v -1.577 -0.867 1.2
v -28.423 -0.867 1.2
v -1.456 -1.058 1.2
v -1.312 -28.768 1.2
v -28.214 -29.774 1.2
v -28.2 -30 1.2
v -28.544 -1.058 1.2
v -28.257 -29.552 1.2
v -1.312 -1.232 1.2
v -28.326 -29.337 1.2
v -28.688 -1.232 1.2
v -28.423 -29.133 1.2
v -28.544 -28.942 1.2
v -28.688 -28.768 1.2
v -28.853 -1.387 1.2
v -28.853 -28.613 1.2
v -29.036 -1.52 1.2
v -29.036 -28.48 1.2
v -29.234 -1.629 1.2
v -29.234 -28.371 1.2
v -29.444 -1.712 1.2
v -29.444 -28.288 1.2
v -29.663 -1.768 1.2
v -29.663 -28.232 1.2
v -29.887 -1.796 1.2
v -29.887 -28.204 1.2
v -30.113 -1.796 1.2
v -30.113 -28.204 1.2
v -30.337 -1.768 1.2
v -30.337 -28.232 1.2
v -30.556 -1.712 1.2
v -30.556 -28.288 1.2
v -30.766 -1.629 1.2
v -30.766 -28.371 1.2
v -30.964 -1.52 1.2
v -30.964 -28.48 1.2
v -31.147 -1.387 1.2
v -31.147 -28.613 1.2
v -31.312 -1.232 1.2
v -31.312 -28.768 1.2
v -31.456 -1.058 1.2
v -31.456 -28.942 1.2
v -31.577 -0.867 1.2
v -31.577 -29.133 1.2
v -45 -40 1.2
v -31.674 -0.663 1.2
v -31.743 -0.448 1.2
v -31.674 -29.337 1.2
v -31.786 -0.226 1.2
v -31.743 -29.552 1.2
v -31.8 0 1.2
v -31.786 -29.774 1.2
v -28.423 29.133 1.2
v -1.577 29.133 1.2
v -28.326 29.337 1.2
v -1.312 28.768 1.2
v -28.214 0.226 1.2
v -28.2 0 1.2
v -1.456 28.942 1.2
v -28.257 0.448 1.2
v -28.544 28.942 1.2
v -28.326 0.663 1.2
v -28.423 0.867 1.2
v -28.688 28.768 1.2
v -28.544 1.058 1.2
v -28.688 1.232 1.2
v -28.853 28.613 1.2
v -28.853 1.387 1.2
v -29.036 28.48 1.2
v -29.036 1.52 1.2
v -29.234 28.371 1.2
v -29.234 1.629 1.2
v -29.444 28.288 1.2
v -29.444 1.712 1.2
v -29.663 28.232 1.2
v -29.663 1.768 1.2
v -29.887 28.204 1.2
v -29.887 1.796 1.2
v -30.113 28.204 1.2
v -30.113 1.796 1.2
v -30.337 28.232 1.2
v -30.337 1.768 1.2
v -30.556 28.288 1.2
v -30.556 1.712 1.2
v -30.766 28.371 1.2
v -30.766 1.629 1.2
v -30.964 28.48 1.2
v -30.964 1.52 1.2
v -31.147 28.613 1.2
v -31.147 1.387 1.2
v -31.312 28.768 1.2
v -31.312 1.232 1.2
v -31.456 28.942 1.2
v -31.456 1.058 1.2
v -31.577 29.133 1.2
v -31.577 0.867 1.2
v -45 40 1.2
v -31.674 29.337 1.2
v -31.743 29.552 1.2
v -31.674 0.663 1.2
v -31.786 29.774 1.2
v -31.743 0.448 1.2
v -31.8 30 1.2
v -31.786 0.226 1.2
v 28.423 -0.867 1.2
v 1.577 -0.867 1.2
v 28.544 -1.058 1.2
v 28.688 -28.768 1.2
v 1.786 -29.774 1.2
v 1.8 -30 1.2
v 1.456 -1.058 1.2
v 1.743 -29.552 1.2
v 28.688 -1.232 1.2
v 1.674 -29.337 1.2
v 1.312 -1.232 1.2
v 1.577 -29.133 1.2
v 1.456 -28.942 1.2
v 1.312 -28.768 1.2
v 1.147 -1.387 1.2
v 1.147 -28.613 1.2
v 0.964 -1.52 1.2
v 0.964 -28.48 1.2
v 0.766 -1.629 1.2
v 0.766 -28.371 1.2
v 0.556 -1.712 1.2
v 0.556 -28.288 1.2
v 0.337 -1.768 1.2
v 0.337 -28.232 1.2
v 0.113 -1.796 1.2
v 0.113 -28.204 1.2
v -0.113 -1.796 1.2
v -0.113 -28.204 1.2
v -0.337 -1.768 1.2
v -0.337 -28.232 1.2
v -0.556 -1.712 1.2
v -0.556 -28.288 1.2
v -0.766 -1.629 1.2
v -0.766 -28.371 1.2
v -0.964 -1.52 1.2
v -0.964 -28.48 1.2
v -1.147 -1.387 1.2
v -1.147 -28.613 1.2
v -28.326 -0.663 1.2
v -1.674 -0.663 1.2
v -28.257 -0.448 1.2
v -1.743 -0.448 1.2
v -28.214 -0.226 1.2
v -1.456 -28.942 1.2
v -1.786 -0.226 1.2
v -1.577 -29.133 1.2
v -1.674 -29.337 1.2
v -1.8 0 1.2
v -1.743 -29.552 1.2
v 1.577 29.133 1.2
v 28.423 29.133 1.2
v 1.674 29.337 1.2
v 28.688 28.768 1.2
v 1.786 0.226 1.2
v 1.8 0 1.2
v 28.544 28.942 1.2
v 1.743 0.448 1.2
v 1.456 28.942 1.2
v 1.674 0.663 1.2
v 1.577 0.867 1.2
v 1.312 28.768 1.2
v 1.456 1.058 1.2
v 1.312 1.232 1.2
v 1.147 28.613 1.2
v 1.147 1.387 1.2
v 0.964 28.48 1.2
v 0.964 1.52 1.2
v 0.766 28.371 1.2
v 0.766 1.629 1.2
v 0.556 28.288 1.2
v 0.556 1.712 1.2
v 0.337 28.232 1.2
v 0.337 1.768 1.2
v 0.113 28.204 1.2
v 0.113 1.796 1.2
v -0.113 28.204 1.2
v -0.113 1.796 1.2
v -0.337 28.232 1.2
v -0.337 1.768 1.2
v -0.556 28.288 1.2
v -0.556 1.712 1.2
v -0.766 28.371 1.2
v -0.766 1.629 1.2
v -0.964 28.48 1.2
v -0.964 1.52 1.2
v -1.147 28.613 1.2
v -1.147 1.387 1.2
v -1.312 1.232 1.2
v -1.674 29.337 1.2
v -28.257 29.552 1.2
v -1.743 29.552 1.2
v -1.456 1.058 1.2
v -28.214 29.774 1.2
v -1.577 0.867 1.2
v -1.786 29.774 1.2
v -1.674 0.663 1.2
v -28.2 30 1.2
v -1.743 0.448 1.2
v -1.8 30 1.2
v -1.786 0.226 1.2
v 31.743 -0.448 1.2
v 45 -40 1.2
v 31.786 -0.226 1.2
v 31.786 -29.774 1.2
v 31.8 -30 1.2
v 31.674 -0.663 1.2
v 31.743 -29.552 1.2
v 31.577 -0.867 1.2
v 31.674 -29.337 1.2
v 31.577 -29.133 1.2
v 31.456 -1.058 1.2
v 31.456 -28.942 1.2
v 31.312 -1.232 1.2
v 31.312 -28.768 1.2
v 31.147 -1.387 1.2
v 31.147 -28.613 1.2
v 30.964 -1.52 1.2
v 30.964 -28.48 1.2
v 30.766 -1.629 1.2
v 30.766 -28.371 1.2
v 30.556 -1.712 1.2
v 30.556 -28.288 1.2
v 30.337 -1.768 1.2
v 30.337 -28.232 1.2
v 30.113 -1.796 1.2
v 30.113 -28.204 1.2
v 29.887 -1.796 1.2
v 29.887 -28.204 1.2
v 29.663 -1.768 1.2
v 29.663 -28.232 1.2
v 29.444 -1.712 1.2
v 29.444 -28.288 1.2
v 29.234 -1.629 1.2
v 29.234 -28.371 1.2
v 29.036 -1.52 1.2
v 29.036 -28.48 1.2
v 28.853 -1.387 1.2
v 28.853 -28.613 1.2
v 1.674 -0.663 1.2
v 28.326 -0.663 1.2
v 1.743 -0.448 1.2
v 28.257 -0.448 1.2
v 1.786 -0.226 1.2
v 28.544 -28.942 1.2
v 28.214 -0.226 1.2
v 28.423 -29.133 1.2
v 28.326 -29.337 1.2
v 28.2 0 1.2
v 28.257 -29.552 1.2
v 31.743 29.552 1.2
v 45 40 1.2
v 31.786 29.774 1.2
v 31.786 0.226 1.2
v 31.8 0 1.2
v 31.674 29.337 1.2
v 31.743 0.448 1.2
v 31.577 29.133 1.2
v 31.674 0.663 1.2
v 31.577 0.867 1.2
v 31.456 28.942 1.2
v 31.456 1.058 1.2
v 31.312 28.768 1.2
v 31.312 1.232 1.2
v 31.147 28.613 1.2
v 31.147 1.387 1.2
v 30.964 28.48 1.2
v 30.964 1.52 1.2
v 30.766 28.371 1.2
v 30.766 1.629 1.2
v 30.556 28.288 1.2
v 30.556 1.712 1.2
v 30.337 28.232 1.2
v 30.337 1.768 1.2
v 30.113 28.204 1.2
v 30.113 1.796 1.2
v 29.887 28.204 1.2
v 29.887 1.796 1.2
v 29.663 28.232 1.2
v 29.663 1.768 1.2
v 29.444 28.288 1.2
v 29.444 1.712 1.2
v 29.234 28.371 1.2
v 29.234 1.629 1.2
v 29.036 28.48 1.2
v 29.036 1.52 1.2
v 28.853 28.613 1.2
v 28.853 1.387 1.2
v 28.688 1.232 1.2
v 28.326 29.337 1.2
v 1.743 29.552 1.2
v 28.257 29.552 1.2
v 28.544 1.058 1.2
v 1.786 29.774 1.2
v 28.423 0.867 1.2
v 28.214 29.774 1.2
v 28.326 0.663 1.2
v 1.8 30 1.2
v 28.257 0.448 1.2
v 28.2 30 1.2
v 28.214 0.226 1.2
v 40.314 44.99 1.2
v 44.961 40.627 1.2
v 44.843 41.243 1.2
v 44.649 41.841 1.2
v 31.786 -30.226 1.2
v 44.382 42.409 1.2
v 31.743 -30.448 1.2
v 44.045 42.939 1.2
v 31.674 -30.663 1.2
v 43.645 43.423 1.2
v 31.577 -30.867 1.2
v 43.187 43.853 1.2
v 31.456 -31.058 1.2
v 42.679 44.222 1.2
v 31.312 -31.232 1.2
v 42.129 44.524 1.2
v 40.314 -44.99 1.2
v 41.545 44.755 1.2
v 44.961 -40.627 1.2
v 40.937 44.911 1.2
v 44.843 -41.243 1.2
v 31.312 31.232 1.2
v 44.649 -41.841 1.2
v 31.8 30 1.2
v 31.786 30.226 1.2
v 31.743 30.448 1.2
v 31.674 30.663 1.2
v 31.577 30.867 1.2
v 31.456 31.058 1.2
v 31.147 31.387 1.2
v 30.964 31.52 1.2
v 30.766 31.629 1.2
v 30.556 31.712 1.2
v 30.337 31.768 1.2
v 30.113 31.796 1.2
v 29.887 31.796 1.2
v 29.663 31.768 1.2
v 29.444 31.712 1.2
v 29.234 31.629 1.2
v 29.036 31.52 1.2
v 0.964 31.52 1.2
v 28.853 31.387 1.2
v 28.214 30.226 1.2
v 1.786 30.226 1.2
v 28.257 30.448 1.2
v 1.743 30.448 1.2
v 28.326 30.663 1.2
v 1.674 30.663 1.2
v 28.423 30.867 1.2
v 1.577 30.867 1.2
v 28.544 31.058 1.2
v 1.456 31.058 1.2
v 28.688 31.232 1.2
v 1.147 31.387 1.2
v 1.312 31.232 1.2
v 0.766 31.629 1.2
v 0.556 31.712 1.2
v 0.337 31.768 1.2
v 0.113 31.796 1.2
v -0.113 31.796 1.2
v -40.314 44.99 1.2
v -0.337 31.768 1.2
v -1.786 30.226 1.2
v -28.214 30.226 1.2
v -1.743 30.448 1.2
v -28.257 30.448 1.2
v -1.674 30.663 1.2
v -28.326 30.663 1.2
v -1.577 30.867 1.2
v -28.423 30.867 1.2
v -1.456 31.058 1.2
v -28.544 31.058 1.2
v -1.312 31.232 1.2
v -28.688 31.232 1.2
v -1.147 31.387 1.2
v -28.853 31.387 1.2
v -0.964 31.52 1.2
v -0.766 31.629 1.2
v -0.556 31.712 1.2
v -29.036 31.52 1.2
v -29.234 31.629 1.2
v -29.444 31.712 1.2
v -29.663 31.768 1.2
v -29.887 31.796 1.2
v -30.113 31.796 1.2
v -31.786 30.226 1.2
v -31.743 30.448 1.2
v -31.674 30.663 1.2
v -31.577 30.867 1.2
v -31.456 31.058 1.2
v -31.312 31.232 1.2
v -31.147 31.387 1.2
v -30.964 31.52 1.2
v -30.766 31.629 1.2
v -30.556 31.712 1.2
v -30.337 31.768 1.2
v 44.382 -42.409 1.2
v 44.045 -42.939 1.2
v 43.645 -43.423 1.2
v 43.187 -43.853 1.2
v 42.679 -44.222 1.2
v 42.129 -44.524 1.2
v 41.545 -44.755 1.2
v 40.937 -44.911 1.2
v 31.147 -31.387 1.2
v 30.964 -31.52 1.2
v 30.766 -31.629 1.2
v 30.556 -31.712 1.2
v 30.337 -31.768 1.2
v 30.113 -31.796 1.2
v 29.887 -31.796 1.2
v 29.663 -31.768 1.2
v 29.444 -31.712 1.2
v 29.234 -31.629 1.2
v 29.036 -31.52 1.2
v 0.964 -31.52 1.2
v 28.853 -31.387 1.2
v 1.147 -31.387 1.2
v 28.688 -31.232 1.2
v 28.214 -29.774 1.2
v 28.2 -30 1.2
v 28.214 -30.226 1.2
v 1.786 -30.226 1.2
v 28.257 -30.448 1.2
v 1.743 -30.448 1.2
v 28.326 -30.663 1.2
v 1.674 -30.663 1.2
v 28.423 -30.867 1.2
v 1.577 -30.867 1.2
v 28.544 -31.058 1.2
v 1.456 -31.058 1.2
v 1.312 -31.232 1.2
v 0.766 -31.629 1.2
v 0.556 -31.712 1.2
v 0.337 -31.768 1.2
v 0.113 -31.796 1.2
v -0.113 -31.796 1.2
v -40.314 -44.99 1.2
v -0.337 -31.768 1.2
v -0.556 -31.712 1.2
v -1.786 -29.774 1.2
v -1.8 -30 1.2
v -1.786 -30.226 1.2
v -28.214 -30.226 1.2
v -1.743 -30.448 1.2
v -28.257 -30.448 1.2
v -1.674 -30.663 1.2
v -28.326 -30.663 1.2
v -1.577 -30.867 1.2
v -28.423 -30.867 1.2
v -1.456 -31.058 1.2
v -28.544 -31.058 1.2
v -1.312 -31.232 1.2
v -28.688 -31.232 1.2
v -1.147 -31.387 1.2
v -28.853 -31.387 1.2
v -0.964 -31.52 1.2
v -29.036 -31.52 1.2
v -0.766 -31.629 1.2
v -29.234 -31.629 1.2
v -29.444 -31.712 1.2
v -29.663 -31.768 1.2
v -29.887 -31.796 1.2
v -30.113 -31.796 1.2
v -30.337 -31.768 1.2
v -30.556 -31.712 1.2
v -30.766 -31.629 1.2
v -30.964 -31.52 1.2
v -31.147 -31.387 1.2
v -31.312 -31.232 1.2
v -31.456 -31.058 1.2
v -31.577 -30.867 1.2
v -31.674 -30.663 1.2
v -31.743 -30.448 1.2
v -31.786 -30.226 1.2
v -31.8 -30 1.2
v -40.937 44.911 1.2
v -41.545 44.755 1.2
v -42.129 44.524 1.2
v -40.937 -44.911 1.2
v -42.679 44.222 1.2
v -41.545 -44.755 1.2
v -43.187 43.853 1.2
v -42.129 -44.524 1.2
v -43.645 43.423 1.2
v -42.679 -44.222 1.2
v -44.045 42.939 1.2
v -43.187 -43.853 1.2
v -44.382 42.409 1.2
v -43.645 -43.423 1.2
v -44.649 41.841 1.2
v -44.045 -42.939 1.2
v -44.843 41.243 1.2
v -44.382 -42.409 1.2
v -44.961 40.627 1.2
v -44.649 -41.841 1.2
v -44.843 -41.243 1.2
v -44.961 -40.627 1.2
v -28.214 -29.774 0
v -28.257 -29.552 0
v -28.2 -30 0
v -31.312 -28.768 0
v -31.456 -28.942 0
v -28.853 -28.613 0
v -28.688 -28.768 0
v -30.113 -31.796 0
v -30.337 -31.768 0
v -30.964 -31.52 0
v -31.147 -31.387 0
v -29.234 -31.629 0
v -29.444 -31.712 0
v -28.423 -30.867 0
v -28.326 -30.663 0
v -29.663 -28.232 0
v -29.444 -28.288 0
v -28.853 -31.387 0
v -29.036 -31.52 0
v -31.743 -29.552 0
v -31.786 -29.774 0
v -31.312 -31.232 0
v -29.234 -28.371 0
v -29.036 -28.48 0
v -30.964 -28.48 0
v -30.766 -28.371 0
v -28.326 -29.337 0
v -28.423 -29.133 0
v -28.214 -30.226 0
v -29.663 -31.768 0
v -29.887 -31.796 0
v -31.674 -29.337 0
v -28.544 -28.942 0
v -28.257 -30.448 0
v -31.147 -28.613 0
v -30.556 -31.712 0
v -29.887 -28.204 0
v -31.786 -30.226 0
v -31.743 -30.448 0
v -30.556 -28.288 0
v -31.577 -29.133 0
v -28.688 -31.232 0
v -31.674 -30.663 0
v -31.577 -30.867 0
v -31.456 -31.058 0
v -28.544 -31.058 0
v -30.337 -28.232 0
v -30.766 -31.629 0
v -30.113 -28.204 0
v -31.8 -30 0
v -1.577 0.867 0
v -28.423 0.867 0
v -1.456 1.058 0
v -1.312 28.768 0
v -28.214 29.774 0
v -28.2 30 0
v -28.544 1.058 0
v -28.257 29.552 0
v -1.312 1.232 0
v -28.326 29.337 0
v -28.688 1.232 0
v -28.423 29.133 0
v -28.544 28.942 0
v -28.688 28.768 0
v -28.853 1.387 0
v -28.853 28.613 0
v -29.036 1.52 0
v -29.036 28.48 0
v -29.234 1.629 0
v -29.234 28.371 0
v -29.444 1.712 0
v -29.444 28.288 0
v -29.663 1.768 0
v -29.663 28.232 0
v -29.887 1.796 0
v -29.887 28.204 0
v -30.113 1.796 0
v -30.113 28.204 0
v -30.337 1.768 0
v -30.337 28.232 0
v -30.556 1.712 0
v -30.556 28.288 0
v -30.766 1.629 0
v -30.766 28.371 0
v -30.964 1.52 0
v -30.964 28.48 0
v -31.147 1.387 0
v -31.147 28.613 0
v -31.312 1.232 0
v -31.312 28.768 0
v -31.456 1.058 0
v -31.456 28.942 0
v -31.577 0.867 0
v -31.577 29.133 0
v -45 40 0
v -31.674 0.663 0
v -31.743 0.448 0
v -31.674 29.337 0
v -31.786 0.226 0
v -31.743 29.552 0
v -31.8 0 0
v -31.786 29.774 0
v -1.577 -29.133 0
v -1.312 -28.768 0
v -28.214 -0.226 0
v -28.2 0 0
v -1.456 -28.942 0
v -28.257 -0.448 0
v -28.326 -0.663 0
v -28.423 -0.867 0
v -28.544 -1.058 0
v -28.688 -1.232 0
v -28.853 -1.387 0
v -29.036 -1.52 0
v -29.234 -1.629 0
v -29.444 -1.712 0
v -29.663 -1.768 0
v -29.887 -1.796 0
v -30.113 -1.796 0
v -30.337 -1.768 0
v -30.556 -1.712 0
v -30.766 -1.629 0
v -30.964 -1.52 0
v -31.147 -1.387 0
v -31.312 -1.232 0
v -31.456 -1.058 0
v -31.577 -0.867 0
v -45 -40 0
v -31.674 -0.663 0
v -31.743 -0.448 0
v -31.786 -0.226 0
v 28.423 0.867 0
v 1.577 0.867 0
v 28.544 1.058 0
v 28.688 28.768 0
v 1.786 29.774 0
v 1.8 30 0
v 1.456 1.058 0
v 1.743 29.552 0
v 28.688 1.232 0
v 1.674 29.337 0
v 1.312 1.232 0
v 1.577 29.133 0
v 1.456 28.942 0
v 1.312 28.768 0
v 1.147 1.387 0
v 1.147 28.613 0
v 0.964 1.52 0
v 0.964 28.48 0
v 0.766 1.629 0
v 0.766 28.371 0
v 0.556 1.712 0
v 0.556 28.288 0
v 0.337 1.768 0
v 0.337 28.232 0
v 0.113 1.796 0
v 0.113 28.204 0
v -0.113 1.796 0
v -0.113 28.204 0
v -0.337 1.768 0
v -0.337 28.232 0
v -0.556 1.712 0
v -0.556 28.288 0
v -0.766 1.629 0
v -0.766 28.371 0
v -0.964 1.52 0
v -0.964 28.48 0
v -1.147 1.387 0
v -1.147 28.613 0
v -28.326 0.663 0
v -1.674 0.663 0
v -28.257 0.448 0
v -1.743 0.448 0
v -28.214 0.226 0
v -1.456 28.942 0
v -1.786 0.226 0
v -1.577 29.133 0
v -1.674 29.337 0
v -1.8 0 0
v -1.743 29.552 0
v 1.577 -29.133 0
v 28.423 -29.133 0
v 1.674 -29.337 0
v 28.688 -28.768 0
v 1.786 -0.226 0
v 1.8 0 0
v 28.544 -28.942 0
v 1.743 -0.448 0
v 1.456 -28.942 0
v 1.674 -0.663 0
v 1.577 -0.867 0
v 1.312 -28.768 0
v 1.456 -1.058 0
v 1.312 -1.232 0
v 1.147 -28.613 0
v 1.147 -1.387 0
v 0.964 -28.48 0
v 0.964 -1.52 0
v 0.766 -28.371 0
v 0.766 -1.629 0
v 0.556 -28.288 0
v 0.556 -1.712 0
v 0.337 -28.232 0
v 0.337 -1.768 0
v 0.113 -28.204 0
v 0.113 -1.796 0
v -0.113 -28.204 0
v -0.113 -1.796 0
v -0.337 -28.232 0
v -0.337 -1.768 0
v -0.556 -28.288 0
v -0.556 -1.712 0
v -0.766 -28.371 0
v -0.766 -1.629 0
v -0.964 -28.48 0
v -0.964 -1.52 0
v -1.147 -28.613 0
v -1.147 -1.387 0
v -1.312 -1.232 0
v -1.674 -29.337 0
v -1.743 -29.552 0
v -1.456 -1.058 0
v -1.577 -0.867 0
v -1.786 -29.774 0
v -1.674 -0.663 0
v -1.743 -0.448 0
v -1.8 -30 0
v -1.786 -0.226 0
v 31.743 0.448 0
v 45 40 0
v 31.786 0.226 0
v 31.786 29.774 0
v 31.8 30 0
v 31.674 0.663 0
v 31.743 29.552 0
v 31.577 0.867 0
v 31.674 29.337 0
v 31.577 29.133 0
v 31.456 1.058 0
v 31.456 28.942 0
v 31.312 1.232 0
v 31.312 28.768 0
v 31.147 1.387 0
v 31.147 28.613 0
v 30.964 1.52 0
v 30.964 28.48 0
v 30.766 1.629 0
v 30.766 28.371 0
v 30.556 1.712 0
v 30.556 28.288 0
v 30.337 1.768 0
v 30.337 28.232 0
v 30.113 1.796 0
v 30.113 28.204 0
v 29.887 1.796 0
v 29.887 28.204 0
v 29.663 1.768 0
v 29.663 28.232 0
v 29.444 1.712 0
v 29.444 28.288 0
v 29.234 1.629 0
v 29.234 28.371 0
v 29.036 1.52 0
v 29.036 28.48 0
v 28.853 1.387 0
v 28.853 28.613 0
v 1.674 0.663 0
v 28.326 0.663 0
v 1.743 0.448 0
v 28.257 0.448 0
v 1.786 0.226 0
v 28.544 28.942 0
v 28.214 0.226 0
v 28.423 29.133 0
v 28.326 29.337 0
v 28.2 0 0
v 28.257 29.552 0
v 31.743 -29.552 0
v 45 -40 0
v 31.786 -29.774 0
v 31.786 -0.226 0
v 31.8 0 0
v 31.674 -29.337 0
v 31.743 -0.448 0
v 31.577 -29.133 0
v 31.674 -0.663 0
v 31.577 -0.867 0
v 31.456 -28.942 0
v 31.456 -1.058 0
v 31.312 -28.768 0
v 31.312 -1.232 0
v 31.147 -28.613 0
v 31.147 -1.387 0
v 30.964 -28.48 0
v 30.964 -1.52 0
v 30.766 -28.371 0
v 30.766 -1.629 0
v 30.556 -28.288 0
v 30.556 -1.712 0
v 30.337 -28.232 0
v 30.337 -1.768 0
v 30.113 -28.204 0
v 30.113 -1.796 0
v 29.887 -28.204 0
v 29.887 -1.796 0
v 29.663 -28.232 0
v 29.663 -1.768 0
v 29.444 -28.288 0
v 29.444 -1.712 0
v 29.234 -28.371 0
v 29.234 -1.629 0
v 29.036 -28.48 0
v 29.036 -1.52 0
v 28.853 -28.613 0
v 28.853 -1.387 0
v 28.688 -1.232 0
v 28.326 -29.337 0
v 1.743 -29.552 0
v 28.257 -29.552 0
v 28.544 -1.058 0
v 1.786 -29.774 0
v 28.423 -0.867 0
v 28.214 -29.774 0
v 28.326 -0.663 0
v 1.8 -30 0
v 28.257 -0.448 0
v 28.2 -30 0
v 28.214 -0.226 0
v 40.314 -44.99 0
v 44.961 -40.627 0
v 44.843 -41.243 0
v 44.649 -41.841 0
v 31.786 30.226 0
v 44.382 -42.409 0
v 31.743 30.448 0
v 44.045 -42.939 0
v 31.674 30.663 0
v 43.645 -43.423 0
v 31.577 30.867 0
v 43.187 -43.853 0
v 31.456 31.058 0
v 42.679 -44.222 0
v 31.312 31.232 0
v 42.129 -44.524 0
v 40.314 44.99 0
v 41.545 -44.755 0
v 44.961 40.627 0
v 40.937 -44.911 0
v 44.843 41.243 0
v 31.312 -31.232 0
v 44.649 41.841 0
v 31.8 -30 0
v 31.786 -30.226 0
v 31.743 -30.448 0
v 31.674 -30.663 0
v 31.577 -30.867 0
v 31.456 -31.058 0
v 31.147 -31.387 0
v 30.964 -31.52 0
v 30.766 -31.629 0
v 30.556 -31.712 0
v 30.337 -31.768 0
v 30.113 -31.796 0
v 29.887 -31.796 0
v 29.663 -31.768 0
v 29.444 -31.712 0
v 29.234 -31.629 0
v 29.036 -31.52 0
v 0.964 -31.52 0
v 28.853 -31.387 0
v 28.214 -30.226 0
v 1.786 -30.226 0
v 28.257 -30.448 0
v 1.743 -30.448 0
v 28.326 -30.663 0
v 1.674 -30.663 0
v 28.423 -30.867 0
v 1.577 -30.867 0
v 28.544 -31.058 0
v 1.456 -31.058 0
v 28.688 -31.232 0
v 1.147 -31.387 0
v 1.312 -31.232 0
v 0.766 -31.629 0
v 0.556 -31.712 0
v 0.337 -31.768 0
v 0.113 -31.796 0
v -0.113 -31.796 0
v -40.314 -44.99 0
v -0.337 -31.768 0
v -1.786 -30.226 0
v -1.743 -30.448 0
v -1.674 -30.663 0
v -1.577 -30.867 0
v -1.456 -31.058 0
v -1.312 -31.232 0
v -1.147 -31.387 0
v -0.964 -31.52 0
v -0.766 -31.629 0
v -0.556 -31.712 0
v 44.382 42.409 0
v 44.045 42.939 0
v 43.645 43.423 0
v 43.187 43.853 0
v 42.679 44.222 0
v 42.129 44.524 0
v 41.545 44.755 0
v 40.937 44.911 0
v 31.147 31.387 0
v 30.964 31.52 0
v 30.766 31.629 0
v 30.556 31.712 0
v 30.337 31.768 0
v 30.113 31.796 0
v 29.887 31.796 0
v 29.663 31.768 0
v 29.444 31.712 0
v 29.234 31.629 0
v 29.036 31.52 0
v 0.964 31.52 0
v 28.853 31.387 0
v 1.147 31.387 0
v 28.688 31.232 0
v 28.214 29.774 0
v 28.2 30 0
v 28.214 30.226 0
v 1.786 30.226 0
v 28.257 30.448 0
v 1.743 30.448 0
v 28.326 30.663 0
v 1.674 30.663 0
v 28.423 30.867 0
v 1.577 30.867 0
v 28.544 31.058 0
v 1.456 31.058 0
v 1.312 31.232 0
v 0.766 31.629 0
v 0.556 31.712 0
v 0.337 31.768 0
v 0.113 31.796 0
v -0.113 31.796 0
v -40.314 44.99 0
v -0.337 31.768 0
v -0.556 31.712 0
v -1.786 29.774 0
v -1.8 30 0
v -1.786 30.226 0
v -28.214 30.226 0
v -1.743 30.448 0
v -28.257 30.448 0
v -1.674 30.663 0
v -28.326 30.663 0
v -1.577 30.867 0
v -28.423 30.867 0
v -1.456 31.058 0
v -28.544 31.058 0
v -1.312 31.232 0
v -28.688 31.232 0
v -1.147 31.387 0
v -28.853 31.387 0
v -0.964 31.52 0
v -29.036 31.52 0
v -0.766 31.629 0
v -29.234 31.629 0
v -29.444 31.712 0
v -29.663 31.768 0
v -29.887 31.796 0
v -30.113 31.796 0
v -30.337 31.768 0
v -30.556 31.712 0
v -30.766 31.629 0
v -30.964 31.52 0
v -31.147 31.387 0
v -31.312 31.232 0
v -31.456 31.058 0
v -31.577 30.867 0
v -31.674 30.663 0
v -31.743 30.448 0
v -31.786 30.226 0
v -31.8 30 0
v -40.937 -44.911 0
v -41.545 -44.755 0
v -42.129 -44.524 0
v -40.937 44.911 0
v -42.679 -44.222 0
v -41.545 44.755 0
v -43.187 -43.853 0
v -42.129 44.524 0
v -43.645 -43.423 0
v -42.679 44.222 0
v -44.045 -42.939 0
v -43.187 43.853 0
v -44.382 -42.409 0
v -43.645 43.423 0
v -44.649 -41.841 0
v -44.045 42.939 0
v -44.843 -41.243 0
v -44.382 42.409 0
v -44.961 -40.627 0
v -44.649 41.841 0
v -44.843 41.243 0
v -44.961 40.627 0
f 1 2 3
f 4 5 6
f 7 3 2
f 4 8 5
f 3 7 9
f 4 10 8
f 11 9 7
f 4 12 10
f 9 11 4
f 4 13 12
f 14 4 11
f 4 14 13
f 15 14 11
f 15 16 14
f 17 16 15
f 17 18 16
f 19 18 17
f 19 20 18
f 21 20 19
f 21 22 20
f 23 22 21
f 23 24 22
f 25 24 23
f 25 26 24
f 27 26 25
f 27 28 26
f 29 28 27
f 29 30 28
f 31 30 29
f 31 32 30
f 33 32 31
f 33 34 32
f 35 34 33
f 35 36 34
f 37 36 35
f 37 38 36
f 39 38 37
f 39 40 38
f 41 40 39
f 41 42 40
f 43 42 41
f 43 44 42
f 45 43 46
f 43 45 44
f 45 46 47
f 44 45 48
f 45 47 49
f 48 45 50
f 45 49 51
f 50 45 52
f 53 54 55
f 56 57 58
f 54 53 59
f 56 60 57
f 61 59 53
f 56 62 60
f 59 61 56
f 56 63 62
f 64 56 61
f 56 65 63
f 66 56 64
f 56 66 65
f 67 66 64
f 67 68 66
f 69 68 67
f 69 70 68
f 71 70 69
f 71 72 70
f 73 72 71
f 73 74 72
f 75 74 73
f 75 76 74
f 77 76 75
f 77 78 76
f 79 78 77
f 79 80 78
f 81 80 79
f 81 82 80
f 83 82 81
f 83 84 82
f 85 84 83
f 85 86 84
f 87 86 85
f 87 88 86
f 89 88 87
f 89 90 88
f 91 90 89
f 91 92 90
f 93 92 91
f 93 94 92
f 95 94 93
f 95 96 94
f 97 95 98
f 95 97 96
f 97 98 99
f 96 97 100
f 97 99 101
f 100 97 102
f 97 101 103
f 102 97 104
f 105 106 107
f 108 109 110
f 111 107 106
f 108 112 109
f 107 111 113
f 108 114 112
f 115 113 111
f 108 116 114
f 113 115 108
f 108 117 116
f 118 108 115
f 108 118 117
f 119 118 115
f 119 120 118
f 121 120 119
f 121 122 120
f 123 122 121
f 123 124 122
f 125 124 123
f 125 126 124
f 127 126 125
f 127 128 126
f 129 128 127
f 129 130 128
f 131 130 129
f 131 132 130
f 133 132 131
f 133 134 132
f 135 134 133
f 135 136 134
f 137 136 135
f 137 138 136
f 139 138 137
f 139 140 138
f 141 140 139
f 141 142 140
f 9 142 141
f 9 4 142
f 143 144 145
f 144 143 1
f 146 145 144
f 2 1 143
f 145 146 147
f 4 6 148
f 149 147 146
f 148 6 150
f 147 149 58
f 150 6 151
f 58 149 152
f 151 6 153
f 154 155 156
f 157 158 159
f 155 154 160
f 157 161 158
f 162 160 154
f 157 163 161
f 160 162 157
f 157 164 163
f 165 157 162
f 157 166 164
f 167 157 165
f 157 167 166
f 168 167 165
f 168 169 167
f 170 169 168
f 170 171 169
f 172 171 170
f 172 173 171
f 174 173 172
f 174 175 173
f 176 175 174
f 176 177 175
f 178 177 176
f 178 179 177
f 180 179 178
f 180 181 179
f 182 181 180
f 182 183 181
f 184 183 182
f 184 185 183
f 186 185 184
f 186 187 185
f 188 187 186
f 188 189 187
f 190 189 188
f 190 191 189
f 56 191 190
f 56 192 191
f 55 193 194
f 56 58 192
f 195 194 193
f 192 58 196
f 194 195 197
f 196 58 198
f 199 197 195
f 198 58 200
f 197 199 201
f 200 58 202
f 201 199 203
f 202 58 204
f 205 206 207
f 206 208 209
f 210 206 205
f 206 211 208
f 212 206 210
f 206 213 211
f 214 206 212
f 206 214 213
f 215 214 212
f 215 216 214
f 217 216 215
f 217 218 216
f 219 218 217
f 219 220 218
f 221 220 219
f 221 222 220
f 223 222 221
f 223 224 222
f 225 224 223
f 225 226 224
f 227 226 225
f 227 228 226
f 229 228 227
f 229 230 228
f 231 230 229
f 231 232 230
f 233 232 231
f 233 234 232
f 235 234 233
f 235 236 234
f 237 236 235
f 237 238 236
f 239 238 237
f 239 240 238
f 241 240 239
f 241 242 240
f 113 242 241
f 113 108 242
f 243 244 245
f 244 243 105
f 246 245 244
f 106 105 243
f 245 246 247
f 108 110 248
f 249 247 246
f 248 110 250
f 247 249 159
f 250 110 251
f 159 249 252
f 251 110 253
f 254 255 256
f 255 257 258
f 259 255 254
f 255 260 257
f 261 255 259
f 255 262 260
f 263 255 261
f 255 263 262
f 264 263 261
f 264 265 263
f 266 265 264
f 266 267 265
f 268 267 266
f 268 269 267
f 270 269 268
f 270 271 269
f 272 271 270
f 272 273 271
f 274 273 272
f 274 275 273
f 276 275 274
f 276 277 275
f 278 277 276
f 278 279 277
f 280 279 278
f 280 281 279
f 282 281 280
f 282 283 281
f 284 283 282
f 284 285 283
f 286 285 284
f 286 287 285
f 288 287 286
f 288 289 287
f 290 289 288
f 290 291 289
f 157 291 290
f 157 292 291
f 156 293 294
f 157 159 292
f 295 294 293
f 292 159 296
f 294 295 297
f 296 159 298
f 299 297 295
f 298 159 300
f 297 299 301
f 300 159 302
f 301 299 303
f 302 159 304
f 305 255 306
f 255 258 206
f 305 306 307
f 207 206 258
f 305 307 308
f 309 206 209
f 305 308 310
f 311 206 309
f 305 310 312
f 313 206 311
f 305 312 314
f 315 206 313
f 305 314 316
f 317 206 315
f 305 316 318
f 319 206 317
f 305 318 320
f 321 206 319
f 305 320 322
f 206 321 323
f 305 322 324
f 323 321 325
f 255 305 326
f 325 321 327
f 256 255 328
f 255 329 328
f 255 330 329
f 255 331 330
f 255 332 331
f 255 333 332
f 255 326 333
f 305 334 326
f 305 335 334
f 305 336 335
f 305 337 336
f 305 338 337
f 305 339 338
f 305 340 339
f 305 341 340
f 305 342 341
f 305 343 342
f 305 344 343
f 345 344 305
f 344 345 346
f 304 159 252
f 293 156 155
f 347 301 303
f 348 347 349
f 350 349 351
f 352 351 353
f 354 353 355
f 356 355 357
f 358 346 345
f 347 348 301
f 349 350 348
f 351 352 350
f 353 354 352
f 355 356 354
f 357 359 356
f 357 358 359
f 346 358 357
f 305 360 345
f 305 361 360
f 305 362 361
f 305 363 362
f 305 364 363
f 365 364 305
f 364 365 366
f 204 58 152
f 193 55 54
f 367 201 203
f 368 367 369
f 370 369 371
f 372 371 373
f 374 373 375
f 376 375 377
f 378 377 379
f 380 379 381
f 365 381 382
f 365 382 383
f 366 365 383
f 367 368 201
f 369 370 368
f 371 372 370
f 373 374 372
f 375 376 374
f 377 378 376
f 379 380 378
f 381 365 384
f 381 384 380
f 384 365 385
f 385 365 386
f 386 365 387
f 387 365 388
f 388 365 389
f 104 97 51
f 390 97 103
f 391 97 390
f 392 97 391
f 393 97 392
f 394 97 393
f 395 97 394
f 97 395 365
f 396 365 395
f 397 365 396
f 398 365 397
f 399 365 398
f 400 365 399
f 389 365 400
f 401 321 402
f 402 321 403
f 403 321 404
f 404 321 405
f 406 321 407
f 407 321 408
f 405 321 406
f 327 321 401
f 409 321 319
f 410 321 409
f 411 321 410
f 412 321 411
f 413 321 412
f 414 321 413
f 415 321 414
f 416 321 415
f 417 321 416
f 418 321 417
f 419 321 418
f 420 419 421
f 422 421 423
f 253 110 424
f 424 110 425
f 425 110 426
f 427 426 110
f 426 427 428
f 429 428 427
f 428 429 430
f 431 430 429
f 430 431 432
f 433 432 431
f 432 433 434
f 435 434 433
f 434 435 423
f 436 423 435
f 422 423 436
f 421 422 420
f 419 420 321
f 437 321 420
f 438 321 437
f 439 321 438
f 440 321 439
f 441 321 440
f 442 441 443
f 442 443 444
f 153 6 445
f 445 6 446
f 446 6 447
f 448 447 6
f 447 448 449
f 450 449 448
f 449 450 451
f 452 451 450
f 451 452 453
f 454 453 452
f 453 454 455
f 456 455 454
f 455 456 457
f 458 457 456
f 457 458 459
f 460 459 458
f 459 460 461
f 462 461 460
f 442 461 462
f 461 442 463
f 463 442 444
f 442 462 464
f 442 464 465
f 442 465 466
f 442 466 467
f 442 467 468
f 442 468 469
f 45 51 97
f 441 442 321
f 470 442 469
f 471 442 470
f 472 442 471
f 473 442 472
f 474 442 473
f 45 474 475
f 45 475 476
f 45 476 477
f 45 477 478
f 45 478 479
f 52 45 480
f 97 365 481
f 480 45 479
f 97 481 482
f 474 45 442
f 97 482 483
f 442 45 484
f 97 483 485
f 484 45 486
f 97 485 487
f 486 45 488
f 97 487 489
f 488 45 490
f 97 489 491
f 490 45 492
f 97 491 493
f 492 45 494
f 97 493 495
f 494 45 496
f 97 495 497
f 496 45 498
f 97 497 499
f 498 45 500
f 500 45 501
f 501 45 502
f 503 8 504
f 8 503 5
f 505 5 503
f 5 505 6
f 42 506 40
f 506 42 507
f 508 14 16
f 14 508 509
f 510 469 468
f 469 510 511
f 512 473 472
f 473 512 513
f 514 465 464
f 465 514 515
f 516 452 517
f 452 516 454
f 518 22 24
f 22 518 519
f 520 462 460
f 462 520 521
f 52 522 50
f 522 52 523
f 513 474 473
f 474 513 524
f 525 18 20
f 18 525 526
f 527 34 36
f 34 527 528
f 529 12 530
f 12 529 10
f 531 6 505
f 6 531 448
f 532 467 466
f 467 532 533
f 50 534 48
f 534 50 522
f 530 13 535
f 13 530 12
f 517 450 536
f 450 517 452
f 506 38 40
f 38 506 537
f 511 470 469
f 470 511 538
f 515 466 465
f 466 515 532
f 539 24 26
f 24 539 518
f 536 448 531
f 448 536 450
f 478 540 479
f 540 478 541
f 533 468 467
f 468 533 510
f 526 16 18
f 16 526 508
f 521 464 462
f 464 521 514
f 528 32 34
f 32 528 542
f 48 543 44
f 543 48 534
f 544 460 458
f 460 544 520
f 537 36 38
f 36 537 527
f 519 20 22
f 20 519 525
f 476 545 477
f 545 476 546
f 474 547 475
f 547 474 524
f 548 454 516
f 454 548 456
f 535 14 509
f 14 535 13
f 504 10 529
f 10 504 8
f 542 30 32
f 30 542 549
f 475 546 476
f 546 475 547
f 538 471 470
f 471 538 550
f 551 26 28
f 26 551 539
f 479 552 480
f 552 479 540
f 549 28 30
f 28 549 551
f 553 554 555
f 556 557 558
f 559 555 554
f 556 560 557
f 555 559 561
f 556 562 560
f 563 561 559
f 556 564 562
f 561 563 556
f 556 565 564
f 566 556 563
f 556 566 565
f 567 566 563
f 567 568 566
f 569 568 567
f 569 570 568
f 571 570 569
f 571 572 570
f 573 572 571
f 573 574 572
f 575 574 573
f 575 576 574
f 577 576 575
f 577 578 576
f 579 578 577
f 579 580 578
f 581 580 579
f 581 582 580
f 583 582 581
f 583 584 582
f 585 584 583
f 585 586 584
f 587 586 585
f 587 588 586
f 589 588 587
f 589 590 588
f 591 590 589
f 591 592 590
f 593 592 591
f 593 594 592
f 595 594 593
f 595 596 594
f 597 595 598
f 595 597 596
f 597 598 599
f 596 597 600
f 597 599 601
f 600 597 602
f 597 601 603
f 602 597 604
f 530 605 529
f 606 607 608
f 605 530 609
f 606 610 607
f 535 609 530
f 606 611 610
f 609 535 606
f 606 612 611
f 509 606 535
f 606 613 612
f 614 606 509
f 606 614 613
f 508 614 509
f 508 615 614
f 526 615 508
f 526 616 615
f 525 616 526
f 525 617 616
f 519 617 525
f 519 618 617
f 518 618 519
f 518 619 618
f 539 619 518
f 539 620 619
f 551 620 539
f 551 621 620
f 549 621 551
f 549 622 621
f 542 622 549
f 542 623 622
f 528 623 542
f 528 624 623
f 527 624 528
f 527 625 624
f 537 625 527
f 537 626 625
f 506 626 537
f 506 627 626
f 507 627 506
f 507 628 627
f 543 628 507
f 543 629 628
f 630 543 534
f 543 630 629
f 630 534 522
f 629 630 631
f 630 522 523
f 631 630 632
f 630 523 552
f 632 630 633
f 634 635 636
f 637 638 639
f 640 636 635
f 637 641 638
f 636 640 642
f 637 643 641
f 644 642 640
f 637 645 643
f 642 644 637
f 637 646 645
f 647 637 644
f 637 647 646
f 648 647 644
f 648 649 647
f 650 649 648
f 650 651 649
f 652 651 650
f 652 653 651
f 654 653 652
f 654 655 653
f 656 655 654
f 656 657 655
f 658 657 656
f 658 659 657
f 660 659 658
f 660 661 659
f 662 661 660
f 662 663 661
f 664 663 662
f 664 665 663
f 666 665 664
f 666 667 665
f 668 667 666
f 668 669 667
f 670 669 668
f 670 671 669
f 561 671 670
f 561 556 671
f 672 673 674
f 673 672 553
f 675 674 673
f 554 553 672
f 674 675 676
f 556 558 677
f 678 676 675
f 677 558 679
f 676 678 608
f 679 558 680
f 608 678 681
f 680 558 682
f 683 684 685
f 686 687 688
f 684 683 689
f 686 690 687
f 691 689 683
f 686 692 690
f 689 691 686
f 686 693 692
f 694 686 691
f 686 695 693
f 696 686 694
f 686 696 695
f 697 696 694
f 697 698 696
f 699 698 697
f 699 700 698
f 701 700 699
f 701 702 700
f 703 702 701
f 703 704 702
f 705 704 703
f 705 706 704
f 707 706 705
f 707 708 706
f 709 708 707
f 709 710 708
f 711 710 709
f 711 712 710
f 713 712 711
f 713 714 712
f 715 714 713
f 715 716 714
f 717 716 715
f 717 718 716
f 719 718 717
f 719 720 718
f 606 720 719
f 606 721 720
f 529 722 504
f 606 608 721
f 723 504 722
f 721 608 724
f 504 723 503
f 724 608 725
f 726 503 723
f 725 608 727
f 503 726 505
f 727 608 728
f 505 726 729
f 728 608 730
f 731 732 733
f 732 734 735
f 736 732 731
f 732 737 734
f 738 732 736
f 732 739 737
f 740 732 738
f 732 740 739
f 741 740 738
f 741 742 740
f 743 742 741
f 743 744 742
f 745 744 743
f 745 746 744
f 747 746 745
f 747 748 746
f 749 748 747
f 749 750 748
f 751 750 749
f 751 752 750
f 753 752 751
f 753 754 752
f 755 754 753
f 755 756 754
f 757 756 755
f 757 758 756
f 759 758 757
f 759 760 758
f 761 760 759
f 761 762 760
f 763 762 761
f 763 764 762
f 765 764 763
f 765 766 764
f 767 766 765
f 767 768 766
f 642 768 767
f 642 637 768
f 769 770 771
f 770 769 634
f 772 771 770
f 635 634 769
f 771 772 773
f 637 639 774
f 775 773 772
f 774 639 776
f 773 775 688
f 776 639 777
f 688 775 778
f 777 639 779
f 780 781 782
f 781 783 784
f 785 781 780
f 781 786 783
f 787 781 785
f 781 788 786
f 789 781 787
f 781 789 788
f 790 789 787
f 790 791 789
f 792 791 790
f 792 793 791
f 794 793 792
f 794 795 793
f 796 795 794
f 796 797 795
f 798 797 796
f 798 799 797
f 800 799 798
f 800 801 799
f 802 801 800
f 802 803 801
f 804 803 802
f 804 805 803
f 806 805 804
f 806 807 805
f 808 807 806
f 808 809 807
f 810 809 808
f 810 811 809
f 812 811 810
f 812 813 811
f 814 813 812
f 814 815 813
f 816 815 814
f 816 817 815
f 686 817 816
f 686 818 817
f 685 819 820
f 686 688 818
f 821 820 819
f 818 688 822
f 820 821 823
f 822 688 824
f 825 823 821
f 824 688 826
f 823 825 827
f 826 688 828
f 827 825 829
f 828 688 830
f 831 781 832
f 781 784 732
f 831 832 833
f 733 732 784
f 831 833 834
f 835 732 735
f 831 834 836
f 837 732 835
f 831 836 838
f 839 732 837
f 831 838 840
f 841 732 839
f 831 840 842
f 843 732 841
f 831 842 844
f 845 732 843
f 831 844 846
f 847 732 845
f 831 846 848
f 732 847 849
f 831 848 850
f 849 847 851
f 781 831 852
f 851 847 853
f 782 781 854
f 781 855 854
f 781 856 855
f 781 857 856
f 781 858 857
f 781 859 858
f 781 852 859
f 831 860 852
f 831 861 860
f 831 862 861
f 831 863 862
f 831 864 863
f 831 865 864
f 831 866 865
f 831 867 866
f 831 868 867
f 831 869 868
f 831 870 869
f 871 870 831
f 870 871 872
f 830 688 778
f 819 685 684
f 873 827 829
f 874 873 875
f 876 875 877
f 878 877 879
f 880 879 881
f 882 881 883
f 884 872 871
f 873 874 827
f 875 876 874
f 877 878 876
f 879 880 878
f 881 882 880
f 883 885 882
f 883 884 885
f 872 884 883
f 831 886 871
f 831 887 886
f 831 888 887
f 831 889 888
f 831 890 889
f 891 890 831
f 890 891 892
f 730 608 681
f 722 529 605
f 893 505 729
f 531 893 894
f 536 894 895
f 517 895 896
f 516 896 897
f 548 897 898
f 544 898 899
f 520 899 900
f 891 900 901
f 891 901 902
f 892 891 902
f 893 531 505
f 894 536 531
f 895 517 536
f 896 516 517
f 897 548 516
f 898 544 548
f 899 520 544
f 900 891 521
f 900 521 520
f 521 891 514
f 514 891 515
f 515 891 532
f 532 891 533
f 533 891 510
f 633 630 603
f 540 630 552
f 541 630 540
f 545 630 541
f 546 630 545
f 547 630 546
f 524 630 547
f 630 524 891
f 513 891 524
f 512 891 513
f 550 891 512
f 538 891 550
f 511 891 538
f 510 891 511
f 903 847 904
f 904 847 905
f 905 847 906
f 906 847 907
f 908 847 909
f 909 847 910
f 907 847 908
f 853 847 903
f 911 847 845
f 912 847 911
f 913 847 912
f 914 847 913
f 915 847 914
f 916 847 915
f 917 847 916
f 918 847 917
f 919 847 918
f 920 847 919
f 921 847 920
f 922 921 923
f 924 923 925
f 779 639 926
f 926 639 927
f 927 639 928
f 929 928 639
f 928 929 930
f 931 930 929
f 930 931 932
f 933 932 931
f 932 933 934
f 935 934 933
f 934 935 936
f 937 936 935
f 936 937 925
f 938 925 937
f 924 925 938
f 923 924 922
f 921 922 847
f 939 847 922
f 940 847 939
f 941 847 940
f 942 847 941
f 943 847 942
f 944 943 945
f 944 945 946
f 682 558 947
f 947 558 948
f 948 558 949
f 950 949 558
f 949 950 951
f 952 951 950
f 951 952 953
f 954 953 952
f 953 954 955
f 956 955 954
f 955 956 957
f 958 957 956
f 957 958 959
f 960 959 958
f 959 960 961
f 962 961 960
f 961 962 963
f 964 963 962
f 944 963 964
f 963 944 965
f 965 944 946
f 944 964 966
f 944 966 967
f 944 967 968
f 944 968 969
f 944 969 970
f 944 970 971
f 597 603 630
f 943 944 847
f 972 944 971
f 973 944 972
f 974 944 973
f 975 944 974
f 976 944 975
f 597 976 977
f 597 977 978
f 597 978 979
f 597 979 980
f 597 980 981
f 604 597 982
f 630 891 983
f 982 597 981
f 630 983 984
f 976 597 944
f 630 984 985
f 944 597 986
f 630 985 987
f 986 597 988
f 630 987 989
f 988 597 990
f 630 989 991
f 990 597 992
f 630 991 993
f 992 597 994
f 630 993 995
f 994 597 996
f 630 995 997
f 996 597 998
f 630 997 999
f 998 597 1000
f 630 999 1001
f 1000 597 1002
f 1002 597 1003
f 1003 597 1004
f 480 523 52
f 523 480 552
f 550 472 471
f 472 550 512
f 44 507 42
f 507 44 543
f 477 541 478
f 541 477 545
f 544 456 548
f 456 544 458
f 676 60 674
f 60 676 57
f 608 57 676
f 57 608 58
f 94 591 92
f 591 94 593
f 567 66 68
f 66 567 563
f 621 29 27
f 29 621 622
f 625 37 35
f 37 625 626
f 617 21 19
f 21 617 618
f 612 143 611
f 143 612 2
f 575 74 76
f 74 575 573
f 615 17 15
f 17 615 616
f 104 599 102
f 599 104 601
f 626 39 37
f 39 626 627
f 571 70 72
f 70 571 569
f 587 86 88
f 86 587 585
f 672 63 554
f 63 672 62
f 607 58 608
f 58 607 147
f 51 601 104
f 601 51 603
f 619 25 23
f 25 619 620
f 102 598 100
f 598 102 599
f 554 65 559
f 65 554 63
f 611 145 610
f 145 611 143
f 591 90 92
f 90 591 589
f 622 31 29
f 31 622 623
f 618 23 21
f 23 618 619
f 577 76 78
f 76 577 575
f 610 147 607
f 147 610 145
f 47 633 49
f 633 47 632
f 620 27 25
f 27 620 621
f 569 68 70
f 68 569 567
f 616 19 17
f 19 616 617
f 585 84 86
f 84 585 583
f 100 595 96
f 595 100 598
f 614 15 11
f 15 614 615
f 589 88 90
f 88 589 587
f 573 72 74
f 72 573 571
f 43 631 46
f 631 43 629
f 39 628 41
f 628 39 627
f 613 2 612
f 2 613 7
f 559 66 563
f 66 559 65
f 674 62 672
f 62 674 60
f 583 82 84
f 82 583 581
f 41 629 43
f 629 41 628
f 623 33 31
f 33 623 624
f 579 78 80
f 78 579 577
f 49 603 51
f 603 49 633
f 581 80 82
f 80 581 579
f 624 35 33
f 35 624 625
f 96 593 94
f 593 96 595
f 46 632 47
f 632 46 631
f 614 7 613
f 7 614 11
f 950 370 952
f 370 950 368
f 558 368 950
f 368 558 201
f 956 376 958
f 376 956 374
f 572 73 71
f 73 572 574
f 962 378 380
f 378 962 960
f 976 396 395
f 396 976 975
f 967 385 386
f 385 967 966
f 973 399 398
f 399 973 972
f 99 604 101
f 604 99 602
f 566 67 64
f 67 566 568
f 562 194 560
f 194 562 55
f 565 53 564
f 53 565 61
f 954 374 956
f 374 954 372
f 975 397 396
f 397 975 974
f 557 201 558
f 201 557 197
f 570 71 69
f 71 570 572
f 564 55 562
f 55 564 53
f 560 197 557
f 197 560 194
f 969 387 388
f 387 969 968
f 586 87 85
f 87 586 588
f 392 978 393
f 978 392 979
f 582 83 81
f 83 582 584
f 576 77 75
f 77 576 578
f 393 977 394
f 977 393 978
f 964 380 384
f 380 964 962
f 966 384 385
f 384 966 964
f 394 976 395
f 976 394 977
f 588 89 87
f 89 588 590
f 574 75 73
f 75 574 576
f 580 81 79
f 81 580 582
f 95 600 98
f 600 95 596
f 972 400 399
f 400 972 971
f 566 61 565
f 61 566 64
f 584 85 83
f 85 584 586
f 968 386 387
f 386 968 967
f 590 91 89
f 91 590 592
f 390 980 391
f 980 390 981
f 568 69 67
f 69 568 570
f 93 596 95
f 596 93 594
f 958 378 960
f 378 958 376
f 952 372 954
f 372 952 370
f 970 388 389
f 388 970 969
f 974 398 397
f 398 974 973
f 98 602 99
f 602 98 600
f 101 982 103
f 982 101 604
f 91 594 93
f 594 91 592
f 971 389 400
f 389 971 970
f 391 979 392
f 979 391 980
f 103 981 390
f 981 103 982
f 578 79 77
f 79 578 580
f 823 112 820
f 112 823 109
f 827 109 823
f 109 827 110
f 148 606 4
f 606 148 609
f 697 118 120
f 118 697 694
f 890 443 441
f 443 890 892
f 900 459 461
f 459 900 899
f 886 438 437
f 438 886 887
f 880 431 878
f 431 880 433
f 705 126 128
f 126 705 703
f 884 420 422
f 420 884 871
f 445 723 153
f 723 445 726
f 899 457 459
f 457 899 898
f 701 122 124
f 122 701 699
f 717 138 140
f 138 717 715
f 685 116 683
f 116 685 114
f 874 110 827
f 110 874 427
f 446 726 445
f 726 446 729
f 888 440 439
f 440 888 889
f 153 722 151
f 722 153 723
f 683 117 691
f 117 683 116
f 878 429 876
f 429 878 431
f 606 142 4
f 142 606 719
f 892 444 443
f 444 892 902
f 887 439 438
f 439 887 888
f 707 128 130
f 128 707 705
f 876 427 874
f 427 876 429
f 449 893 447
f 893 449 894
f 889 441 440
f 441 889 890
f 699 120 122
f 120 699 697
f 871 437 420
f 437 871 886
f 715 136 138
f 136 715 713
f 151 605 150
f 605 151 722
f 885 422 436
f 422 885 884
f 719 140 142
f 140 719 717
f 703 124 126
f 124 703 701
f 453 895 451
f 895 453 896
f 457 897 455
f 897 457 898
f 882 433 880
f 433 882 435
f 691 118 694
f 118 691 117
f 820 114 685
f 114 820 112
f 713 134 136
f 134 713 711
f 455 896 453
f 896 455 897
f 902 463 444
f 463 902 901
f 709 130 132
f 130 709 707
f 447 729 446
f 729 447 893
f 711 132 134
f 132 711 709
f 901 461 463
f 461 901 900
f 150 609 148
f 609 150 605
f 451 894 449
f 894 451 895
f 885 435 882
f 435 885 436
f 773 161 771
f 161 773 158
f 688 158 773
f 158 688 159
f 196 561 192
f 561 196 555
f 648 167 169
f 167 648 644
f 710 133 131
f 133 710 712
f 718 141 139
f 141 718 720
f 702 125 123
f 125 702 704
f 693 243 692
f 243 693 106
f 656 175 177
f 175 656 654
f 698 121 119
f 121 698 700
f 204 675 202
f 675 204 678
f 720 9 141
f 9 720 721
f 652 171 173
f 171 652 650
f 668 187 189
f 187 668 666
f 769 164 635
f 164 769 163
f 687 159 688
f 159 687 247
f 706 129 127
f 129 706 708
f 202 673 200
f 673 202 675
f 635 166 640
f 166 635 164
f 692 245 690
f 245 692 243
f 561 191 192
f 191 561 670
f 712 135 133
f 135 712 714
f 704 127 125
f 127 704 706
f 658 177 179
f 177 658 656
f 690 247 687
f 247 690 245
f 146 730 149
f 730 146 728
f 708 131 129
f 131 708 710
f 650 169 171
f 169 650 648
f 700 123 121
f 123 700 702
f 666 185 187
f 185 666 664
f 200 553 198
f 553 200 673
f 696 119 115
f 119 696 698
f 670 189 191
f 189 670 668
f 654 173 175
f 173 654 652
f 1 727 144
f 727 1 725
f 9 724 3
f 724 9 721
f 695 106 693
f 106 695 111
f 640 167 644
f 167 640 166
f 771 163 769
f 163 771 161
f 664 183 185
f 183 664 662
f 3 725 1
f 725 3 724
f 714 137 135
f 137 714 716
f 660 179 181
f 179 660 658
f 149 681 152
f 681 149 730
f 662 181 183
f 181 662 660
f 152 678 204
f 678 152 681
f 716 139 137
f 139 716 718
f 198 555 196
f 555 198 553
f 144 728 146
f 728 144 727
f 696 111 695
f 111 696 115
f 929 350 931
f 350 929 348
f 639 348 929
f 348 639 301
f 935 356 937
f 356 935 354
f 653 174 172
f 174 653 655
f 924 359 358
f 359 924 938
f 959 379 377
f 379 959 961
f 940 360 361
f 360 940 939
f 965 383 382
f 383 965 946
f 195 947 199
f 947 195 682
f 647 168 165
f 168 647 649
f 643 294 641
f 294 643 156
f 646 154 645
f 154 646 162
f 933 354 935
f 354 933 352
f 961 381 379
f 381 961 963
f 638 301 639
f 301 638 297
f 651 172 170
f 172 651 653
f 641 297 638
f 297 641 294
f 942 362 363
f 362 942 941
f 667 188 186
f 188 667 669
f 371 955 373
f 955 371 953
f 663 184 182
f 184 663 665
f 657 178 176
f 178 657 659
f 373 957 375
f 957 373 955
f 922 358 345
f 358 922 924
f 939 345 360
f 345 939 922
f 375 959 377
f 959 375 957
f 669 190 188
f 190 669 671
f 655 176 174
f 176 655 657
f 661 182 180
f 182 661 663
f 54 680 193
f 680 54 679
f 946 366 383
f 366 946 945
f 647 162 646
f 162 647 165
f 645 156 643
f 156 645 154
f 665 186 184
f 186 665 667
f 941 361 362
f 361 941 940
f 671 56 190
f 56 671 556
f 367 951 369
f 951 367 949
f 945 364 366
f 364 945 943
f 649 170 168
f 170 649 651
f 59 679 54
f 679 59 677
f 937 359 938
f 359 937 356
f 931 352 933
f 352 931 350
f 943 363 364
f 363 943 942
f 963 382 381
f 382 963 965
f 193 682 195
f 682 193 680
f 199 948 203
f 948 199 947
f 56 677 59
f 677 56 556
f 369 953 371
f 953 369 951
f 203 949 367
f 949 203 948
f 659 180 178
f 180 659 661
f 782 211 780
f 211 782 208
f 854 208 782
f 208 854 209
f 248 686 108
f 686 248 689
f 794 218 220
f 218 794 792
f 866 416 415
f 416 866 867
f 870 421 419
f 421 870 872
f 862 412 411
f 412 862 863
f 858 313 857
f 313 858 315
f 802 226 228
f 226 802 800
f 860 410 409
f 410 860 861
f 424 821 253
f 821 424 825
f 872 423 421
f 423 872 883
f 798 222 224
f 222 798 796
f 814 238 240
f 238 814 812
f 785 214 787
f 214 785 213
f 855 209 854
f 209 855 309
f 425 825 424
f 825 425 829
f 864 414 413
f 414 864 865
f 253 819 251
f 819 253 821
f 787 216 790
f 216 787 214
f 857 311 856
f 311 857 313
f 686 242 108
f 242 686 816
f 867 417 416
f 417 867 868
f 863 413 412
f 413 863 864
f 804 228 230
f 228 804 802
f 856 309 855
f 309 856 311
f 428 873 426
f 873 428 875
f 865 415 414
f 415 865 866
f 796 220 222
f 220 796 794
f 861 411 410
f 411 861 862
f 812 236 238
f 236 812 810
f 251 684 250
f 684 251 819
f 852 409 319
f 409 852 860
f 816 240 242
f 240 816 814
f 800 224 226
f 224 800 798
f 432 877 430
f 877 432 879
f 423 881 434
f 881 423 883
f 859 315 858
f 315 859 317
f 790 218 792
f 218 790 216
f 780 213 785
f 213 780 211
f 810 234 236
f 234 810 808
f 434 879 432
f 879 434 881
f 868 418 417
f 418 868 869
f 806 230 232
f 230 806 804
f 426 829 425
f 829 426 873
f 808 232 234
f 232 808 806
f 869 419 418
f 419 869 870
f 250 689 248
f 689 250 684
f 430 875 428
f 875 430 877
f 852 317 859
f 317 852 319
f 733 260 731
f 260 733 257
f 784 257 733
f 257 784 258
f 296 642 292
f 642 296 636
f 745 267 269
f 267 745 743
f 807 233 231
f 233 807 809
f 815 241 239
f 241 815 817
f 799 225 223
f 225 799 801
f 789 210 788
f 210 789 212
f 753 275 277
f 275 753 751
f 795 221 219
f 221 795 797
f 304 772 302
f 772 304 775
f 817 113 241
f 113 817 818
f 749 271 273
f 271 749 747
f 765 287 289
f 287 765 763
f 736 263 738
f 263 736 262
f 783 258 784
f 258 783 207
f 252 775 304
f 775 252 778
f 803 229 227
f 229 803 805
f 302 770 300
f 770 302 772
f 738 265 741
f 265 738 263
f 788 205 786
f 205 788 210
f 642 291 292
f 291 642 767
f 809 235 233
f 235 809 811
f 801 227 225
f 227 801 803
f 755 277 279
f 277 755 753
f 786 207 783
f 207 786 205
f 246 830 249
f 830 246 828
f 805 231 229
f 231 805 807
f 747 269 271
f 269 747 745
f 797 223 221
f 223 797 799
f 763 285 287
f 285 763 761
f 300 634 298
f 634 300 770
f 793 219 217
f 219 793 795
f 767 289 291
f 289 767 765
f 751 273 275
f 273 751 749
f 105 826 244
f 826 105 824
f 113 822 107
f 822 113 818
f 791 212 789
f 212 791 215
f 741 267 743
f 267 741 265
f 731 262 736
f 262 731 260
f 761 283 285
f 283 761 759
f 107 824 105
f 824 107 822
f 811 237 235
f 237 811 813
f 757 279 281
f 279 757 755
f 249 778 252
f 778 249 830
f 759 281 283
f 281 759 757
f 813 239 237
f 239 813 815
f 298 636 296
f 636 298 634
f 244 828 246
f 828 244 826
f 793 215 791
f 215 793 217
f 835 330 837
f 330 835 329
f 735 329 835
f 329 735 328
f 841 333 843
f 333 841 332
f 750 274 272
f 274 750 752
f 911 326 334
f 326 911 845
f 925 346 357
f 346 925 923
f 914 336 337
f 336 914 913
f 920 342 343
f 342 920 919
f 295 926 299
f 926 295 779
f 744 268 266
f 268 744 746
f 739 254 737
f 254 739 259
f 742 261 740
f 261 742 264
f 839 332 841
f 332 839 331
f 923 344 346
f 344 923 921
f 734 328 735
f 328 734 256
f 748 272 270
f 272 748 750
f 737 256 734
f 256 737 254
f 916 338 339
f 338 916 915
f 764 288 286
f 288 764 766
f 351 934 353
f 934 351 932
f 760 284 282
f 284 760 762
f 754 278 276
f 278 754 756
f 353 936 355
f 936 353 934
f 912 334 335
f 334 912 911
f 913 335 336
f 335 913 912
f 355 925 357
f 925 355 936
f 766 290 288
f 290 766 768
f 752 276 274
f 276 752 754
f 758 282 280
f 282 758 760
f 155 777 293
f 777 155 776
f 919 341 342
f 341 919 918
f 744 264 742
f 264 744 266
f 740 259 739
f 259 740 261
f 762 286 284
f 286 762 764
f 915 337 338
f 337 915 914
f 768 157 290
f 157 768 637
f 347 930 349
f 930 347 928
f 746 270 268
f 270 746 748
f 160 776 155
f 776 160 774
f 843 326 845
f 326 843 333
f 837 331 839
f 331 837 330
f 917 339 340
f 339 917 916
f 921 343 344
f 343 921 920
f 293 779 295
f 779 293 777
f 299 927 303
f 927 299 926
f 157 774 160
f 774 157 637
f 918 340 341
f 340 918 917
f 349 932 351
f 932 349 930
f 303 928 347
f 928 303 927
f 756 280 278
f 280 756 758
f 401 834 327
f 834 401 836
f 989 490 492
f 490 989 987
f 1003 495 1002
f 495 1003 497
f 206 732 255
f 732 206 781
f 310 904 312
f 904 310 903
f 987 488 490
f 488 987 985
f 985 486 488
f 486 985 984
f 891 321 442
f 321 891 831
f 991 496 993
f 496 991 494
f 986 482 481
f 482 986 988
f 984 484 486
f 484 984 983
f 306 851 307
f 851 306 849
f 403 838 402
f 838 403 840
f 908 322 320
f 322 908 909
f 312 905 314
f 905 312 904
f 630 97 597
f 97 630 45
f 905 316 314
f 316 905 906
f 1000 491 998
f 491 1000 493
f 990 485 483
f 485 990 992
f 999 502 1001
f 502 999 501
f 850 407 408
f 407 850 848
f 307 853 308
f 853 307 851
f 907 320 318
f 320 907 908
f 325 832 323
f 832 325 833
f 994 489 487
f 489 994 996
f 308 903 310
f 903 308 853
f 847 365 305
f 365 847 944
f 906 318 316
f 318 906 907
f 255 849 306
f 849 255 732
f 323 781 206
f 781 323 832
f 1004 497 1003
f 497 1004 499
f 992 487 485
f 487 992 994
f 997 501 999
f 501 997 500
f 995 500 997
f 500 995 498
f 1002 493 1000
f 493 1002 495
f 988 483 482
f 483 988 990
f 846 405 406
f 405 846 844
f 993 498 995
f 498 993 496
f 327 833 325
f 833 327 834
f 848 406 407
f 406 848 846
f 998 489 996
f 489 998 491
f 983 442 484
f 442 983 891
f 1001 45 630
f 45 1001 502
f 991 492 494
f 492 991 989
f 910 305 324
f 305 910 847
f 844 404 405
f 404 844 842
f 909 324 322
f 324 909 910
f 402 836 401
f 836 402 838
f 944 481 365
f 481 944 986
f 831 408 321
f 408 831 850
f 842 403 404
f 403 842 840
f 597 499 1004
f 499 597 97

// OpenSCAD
$fn = 50;


difference() {
	union() {
		hull() {
			translate(v = [-40.0000000000, 40.0000000000, 0]) {
				cylinder(h = 12, r = 5);
			}
			translate(v = [40.0000000000, 40.0000000000, 0]) {
				cylinder(h = 12, r = 5);
			}
			translate(v = [-40.0000000000, -40.0000000000, 0]) {
				cylinder(h = 12, r = 5);
			}
			translate(v = [40.0000000000, -40.0000000000, 0]) {
				cylinder(h = 12, r = 5);
			}
		}
	}
	union() {
		translate(v = [0, 0, 1.2000000000]) {
			hull() {
				translate(v = [-40.0000000000, 40.0000000000, 0]) {
					cylinder(h = 10.8000000000, r = 3.8000000000);
				}
				translate(v = [40.0000000000, 40.0000000000, 0]) {
					cylinder(h = 10.8000000000, r = 3.8000000000);
				}
				translate(v = [-40.0000000000, -40.0000000000, 0]) {
					cylinder(h = 10.8000000000, r = 3.8000000000);
				}
				translate(v = [40.0000000000, -40.0000000000, 0]) {
					cylinder(h = 10.8000000000, r = 3.8000000000);
				}
			}
		}
		#translate(v = [-30.0000000000, -30.0000000000, 0]) {
			cylinder(h = 1.2000000000, r = 1.8000000000);
		}
		#translate(v = [-30.0000000000, 0.0000000000, 0]) {
			cylinder(h = 1.2000000000, r = 1.8000000000);
		}
		#translate(v = [-30.0000000000, 30.0000000000, 0]) {
			cylinder(h = 1.2000000000, r = 1.8000000000);
		}
		#translate(v = [0.0000000000, -30.0000000000, 0]) {
			cylinder(h = 1.2000000000, r = 1.8000000000);
		}
		#cylinder(h = 1.2000000000, r = 1.8000000000);
		#translate(v = [0.0000000000, 30.0000000000, 0]) {
			cylinder(h = 1.2000000000, r = 1.8000000000);
		}
		#translate(v = [30.0000000000, -30.0000000000, 0]) {
			cylinder(h = 1.2000000000, r = 1.8000000000);
		}
		#translate(v = [30.0000000000, 0.0000000000, 0]) {
			cylinder(h = 1.2000000000, r = 1.8000000000);
		}
		#translate(v = [30.0000000000, 30.0000000000, 0]) {
			cylinder(h = 1.2000000000, r = 1.8000000000);
		}
		translate(v = [-250.0000000000, -250.0000000000, 1.2000000000]) {
			cube(size = [500, 500, 500]);
		}
		translate(v = [-250.0000000000, -250.0000000000, 1.2000000000]) {
			cube(size = [500, 500, 500]);
		}
		translate(v = [-250.0000000000, -250.0000000000, 1.2000000000]) {
			cube(size = [500, 500, 500]);
		}
	}
}
